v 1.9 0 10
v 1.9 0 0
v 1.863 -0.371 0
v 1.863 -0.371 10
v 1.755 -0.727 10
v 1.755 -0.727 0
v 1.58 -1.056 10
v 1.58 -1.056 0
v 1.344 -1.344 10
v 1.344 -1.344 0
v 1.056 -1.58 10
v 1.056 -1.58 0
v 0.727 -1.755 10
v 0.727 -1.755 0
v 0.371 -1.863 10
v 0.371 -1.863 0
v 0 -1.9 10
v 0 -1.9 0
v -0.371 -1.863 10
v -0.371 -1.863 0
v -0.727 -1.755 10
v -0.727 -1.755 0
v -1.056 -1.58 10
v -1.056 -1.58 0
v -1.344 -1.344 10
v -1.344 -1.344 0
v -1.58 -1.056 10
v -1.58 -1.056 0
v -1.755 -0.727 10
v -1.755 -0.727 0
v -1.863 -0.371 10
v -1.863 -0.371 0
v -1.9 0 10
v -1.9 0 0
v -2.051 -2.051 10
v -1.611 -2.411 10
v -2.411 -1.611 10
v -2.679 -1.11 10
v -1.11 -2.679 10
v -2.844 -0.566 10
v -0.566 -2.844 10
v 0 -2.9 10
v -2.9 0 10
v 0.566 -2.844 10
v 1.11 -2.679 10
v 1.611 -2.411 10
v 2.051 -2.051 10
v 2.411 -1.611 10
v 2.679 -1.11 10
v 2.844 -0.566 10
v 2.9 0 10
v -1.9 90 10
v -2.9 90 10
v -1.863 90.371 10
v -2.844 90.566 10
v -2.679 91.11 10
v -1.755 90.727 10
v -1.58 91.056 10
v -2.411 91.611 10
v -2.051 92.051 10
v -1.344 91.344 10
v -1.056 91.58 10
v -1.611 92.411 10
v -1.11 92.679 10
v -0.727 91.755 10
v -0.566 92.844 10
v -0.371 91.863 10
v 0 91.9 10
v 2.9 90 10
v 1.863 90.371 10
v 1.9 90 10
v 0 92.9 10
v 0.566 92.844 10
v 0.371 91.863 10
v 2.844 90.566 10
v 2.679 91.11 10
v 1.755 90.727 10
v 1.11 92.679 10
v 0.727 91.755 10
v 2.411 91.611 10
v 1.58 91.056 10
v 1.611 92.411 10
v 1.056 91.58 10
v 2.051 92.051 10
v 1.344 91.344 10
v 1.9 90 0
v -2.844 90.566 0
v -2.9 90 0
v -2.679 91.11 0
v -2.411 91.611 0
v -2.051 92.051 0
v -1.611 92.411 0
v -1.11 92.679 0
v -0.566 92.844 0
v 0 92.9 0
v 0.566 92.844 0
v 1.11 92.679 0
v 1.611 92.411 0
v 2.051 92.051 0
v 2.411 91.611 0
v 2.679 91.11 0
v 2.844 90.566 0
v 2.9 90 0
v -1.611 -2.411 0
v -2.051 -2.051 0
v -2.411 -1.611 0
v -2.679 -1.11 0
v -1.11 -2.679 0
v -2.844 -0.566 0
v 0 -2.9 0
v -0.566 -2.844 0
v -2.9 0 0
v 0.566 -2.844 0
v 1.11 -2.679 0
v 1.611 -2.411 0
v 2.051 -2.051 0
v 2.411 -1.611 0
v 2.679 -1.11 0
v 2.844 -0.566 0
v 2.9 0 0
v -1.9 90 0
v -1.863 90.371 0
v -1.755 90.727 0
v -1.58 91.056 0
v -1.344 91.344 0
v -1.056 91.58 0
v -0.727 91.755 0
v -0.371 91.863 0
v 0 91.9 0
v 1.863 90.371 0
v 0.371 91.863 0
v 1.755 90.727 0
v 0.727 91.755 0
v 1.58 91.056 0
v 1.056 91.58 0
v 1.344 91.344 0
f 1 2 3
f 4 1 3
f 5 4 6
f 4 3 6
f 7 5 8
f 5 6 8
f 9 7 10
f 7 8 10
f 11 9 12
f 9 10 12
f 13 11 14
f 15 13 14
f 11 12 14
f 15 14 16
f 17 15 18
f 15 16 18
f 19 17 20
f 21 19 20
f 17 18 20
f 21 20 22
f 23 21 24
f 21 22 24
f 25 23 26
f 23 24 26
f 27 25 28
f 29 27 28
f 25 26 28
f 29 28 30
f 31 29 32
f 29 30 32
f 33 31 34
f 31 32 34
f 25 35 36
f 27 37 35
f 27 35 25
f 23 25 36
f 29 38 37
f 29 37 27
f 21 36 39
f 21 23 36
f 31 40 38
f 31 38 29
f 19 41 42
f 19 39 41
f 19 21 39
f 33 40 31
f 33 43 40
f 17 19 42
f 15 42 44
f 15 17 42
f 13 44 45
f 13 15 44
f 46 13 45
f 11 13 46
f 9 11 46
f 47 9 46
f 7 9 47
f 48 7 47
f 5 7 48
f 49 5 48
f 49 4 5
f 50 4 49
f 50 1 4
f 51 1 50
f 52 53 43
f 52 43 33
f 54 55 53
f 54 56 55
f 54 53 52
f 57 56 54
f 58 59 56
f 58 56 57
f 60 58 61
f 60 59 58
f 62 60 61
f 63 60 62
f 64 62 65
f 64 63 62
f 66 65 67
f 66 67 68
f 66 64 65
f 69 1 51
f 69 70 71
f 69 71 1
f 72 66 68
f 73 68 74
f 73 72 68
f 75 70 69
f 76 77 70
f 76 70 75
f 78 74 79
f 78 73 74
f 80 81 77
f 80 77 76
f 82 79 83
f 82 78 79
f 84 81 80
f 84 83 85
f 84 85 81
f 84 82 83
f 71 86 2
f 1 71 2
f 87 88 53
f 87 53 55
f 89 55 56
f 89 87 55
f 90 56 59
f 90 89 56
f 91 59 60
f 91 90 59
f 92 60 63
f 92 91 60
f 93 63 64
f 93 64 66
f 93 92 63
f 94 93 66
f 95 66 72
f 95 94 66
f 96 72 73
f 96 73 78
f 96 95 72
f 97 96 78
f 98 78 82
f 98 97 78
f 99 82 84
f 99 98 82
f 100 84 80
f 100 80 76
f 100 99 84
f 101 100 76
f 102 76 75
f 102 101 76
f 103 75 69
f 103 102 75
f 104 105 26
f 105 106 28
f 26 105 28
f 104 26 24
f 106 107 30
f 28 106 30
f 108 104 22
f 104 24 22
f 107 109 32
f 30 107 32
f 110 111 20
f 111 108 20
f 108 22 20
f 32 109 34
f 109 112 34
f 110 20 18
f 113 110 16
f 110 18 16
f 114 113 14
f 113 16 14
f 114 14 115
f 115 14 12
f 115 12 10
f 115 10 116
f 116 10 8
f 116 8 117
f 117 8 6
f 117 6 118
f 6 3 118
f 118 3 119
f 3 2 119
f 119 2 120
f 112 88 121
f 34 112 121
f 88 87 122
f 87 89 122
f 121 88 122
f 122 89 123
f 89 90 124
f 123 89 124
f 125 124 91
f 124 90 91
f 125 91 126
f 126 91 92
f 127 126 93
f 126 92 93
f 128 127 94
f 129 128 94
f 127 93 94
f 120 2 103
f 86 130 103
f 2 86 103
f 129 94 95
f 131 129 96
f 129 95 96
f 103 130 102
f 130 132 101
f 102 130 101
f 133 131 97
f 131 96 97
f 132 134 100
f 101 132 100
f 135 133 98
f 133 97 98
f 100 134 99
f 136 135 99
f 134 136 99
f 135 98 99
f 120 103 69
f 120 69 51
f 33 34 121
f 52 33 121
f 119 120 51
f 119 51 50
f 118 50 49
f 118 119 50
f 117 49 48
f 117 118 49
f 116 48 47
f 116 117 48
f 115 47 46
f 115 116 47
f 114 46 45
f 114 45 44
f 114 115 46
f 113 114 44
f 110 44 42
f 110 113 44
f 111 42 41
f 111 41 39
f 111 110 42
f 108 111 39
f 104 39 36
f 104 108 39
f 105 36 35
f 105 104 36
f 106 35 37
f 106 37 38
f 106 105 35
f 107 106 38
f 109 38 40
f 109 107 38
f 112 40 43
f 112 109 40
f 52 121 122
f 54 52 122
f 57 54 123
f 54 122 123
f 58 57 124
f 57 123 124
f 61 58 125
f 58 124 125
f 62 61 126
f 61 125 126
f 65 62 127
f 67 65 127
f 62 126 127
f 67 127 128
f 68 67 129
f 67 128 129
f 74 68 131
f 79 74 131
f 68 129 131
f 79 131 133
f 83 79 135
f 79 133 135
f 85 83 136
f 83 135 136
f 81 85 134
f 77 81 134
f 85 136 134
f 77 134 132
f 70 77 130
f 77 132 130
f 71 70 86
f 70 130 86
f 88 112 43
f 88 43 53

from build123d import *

# Parameters (mm, degrees)
SURFACE_EXTRUDE1_1_DEPTH = 10
THICKEN1_T1              = 1


with BuildPart() as body_1:
    # Surface-Extrude1: a surface, the sketch's curves swept straight by 10 mm
    with BuildLine(Plane.XY, mode=Mode.PRIVATE) as surface_extrude1_1_path:
        Line((-1.9, 0), (-1.9, 90))
        ThreePointArc((-1.9, 90), (0, 91.9), (1.9, 90))
        Line((1.9, 90), (1.9, 0))
        ThreePointArc((1.9, 0), (0, -1.9), (-1.9, 0))
    surface_extrude1_1 = Shell.extrude(surface_extrude1_1_path.wire(), (0 * SURFACE_EXTRUDE1_1_DEPTH, 0 * SURFACE_EXTRUDE1_1_DEPTH, 1 * SURFACE_EXTRUDE1_1_DEPTH))
    add(Solid.thicken(surface_extrude1_1, THICKEN1_T1))


solid = body_1.part
